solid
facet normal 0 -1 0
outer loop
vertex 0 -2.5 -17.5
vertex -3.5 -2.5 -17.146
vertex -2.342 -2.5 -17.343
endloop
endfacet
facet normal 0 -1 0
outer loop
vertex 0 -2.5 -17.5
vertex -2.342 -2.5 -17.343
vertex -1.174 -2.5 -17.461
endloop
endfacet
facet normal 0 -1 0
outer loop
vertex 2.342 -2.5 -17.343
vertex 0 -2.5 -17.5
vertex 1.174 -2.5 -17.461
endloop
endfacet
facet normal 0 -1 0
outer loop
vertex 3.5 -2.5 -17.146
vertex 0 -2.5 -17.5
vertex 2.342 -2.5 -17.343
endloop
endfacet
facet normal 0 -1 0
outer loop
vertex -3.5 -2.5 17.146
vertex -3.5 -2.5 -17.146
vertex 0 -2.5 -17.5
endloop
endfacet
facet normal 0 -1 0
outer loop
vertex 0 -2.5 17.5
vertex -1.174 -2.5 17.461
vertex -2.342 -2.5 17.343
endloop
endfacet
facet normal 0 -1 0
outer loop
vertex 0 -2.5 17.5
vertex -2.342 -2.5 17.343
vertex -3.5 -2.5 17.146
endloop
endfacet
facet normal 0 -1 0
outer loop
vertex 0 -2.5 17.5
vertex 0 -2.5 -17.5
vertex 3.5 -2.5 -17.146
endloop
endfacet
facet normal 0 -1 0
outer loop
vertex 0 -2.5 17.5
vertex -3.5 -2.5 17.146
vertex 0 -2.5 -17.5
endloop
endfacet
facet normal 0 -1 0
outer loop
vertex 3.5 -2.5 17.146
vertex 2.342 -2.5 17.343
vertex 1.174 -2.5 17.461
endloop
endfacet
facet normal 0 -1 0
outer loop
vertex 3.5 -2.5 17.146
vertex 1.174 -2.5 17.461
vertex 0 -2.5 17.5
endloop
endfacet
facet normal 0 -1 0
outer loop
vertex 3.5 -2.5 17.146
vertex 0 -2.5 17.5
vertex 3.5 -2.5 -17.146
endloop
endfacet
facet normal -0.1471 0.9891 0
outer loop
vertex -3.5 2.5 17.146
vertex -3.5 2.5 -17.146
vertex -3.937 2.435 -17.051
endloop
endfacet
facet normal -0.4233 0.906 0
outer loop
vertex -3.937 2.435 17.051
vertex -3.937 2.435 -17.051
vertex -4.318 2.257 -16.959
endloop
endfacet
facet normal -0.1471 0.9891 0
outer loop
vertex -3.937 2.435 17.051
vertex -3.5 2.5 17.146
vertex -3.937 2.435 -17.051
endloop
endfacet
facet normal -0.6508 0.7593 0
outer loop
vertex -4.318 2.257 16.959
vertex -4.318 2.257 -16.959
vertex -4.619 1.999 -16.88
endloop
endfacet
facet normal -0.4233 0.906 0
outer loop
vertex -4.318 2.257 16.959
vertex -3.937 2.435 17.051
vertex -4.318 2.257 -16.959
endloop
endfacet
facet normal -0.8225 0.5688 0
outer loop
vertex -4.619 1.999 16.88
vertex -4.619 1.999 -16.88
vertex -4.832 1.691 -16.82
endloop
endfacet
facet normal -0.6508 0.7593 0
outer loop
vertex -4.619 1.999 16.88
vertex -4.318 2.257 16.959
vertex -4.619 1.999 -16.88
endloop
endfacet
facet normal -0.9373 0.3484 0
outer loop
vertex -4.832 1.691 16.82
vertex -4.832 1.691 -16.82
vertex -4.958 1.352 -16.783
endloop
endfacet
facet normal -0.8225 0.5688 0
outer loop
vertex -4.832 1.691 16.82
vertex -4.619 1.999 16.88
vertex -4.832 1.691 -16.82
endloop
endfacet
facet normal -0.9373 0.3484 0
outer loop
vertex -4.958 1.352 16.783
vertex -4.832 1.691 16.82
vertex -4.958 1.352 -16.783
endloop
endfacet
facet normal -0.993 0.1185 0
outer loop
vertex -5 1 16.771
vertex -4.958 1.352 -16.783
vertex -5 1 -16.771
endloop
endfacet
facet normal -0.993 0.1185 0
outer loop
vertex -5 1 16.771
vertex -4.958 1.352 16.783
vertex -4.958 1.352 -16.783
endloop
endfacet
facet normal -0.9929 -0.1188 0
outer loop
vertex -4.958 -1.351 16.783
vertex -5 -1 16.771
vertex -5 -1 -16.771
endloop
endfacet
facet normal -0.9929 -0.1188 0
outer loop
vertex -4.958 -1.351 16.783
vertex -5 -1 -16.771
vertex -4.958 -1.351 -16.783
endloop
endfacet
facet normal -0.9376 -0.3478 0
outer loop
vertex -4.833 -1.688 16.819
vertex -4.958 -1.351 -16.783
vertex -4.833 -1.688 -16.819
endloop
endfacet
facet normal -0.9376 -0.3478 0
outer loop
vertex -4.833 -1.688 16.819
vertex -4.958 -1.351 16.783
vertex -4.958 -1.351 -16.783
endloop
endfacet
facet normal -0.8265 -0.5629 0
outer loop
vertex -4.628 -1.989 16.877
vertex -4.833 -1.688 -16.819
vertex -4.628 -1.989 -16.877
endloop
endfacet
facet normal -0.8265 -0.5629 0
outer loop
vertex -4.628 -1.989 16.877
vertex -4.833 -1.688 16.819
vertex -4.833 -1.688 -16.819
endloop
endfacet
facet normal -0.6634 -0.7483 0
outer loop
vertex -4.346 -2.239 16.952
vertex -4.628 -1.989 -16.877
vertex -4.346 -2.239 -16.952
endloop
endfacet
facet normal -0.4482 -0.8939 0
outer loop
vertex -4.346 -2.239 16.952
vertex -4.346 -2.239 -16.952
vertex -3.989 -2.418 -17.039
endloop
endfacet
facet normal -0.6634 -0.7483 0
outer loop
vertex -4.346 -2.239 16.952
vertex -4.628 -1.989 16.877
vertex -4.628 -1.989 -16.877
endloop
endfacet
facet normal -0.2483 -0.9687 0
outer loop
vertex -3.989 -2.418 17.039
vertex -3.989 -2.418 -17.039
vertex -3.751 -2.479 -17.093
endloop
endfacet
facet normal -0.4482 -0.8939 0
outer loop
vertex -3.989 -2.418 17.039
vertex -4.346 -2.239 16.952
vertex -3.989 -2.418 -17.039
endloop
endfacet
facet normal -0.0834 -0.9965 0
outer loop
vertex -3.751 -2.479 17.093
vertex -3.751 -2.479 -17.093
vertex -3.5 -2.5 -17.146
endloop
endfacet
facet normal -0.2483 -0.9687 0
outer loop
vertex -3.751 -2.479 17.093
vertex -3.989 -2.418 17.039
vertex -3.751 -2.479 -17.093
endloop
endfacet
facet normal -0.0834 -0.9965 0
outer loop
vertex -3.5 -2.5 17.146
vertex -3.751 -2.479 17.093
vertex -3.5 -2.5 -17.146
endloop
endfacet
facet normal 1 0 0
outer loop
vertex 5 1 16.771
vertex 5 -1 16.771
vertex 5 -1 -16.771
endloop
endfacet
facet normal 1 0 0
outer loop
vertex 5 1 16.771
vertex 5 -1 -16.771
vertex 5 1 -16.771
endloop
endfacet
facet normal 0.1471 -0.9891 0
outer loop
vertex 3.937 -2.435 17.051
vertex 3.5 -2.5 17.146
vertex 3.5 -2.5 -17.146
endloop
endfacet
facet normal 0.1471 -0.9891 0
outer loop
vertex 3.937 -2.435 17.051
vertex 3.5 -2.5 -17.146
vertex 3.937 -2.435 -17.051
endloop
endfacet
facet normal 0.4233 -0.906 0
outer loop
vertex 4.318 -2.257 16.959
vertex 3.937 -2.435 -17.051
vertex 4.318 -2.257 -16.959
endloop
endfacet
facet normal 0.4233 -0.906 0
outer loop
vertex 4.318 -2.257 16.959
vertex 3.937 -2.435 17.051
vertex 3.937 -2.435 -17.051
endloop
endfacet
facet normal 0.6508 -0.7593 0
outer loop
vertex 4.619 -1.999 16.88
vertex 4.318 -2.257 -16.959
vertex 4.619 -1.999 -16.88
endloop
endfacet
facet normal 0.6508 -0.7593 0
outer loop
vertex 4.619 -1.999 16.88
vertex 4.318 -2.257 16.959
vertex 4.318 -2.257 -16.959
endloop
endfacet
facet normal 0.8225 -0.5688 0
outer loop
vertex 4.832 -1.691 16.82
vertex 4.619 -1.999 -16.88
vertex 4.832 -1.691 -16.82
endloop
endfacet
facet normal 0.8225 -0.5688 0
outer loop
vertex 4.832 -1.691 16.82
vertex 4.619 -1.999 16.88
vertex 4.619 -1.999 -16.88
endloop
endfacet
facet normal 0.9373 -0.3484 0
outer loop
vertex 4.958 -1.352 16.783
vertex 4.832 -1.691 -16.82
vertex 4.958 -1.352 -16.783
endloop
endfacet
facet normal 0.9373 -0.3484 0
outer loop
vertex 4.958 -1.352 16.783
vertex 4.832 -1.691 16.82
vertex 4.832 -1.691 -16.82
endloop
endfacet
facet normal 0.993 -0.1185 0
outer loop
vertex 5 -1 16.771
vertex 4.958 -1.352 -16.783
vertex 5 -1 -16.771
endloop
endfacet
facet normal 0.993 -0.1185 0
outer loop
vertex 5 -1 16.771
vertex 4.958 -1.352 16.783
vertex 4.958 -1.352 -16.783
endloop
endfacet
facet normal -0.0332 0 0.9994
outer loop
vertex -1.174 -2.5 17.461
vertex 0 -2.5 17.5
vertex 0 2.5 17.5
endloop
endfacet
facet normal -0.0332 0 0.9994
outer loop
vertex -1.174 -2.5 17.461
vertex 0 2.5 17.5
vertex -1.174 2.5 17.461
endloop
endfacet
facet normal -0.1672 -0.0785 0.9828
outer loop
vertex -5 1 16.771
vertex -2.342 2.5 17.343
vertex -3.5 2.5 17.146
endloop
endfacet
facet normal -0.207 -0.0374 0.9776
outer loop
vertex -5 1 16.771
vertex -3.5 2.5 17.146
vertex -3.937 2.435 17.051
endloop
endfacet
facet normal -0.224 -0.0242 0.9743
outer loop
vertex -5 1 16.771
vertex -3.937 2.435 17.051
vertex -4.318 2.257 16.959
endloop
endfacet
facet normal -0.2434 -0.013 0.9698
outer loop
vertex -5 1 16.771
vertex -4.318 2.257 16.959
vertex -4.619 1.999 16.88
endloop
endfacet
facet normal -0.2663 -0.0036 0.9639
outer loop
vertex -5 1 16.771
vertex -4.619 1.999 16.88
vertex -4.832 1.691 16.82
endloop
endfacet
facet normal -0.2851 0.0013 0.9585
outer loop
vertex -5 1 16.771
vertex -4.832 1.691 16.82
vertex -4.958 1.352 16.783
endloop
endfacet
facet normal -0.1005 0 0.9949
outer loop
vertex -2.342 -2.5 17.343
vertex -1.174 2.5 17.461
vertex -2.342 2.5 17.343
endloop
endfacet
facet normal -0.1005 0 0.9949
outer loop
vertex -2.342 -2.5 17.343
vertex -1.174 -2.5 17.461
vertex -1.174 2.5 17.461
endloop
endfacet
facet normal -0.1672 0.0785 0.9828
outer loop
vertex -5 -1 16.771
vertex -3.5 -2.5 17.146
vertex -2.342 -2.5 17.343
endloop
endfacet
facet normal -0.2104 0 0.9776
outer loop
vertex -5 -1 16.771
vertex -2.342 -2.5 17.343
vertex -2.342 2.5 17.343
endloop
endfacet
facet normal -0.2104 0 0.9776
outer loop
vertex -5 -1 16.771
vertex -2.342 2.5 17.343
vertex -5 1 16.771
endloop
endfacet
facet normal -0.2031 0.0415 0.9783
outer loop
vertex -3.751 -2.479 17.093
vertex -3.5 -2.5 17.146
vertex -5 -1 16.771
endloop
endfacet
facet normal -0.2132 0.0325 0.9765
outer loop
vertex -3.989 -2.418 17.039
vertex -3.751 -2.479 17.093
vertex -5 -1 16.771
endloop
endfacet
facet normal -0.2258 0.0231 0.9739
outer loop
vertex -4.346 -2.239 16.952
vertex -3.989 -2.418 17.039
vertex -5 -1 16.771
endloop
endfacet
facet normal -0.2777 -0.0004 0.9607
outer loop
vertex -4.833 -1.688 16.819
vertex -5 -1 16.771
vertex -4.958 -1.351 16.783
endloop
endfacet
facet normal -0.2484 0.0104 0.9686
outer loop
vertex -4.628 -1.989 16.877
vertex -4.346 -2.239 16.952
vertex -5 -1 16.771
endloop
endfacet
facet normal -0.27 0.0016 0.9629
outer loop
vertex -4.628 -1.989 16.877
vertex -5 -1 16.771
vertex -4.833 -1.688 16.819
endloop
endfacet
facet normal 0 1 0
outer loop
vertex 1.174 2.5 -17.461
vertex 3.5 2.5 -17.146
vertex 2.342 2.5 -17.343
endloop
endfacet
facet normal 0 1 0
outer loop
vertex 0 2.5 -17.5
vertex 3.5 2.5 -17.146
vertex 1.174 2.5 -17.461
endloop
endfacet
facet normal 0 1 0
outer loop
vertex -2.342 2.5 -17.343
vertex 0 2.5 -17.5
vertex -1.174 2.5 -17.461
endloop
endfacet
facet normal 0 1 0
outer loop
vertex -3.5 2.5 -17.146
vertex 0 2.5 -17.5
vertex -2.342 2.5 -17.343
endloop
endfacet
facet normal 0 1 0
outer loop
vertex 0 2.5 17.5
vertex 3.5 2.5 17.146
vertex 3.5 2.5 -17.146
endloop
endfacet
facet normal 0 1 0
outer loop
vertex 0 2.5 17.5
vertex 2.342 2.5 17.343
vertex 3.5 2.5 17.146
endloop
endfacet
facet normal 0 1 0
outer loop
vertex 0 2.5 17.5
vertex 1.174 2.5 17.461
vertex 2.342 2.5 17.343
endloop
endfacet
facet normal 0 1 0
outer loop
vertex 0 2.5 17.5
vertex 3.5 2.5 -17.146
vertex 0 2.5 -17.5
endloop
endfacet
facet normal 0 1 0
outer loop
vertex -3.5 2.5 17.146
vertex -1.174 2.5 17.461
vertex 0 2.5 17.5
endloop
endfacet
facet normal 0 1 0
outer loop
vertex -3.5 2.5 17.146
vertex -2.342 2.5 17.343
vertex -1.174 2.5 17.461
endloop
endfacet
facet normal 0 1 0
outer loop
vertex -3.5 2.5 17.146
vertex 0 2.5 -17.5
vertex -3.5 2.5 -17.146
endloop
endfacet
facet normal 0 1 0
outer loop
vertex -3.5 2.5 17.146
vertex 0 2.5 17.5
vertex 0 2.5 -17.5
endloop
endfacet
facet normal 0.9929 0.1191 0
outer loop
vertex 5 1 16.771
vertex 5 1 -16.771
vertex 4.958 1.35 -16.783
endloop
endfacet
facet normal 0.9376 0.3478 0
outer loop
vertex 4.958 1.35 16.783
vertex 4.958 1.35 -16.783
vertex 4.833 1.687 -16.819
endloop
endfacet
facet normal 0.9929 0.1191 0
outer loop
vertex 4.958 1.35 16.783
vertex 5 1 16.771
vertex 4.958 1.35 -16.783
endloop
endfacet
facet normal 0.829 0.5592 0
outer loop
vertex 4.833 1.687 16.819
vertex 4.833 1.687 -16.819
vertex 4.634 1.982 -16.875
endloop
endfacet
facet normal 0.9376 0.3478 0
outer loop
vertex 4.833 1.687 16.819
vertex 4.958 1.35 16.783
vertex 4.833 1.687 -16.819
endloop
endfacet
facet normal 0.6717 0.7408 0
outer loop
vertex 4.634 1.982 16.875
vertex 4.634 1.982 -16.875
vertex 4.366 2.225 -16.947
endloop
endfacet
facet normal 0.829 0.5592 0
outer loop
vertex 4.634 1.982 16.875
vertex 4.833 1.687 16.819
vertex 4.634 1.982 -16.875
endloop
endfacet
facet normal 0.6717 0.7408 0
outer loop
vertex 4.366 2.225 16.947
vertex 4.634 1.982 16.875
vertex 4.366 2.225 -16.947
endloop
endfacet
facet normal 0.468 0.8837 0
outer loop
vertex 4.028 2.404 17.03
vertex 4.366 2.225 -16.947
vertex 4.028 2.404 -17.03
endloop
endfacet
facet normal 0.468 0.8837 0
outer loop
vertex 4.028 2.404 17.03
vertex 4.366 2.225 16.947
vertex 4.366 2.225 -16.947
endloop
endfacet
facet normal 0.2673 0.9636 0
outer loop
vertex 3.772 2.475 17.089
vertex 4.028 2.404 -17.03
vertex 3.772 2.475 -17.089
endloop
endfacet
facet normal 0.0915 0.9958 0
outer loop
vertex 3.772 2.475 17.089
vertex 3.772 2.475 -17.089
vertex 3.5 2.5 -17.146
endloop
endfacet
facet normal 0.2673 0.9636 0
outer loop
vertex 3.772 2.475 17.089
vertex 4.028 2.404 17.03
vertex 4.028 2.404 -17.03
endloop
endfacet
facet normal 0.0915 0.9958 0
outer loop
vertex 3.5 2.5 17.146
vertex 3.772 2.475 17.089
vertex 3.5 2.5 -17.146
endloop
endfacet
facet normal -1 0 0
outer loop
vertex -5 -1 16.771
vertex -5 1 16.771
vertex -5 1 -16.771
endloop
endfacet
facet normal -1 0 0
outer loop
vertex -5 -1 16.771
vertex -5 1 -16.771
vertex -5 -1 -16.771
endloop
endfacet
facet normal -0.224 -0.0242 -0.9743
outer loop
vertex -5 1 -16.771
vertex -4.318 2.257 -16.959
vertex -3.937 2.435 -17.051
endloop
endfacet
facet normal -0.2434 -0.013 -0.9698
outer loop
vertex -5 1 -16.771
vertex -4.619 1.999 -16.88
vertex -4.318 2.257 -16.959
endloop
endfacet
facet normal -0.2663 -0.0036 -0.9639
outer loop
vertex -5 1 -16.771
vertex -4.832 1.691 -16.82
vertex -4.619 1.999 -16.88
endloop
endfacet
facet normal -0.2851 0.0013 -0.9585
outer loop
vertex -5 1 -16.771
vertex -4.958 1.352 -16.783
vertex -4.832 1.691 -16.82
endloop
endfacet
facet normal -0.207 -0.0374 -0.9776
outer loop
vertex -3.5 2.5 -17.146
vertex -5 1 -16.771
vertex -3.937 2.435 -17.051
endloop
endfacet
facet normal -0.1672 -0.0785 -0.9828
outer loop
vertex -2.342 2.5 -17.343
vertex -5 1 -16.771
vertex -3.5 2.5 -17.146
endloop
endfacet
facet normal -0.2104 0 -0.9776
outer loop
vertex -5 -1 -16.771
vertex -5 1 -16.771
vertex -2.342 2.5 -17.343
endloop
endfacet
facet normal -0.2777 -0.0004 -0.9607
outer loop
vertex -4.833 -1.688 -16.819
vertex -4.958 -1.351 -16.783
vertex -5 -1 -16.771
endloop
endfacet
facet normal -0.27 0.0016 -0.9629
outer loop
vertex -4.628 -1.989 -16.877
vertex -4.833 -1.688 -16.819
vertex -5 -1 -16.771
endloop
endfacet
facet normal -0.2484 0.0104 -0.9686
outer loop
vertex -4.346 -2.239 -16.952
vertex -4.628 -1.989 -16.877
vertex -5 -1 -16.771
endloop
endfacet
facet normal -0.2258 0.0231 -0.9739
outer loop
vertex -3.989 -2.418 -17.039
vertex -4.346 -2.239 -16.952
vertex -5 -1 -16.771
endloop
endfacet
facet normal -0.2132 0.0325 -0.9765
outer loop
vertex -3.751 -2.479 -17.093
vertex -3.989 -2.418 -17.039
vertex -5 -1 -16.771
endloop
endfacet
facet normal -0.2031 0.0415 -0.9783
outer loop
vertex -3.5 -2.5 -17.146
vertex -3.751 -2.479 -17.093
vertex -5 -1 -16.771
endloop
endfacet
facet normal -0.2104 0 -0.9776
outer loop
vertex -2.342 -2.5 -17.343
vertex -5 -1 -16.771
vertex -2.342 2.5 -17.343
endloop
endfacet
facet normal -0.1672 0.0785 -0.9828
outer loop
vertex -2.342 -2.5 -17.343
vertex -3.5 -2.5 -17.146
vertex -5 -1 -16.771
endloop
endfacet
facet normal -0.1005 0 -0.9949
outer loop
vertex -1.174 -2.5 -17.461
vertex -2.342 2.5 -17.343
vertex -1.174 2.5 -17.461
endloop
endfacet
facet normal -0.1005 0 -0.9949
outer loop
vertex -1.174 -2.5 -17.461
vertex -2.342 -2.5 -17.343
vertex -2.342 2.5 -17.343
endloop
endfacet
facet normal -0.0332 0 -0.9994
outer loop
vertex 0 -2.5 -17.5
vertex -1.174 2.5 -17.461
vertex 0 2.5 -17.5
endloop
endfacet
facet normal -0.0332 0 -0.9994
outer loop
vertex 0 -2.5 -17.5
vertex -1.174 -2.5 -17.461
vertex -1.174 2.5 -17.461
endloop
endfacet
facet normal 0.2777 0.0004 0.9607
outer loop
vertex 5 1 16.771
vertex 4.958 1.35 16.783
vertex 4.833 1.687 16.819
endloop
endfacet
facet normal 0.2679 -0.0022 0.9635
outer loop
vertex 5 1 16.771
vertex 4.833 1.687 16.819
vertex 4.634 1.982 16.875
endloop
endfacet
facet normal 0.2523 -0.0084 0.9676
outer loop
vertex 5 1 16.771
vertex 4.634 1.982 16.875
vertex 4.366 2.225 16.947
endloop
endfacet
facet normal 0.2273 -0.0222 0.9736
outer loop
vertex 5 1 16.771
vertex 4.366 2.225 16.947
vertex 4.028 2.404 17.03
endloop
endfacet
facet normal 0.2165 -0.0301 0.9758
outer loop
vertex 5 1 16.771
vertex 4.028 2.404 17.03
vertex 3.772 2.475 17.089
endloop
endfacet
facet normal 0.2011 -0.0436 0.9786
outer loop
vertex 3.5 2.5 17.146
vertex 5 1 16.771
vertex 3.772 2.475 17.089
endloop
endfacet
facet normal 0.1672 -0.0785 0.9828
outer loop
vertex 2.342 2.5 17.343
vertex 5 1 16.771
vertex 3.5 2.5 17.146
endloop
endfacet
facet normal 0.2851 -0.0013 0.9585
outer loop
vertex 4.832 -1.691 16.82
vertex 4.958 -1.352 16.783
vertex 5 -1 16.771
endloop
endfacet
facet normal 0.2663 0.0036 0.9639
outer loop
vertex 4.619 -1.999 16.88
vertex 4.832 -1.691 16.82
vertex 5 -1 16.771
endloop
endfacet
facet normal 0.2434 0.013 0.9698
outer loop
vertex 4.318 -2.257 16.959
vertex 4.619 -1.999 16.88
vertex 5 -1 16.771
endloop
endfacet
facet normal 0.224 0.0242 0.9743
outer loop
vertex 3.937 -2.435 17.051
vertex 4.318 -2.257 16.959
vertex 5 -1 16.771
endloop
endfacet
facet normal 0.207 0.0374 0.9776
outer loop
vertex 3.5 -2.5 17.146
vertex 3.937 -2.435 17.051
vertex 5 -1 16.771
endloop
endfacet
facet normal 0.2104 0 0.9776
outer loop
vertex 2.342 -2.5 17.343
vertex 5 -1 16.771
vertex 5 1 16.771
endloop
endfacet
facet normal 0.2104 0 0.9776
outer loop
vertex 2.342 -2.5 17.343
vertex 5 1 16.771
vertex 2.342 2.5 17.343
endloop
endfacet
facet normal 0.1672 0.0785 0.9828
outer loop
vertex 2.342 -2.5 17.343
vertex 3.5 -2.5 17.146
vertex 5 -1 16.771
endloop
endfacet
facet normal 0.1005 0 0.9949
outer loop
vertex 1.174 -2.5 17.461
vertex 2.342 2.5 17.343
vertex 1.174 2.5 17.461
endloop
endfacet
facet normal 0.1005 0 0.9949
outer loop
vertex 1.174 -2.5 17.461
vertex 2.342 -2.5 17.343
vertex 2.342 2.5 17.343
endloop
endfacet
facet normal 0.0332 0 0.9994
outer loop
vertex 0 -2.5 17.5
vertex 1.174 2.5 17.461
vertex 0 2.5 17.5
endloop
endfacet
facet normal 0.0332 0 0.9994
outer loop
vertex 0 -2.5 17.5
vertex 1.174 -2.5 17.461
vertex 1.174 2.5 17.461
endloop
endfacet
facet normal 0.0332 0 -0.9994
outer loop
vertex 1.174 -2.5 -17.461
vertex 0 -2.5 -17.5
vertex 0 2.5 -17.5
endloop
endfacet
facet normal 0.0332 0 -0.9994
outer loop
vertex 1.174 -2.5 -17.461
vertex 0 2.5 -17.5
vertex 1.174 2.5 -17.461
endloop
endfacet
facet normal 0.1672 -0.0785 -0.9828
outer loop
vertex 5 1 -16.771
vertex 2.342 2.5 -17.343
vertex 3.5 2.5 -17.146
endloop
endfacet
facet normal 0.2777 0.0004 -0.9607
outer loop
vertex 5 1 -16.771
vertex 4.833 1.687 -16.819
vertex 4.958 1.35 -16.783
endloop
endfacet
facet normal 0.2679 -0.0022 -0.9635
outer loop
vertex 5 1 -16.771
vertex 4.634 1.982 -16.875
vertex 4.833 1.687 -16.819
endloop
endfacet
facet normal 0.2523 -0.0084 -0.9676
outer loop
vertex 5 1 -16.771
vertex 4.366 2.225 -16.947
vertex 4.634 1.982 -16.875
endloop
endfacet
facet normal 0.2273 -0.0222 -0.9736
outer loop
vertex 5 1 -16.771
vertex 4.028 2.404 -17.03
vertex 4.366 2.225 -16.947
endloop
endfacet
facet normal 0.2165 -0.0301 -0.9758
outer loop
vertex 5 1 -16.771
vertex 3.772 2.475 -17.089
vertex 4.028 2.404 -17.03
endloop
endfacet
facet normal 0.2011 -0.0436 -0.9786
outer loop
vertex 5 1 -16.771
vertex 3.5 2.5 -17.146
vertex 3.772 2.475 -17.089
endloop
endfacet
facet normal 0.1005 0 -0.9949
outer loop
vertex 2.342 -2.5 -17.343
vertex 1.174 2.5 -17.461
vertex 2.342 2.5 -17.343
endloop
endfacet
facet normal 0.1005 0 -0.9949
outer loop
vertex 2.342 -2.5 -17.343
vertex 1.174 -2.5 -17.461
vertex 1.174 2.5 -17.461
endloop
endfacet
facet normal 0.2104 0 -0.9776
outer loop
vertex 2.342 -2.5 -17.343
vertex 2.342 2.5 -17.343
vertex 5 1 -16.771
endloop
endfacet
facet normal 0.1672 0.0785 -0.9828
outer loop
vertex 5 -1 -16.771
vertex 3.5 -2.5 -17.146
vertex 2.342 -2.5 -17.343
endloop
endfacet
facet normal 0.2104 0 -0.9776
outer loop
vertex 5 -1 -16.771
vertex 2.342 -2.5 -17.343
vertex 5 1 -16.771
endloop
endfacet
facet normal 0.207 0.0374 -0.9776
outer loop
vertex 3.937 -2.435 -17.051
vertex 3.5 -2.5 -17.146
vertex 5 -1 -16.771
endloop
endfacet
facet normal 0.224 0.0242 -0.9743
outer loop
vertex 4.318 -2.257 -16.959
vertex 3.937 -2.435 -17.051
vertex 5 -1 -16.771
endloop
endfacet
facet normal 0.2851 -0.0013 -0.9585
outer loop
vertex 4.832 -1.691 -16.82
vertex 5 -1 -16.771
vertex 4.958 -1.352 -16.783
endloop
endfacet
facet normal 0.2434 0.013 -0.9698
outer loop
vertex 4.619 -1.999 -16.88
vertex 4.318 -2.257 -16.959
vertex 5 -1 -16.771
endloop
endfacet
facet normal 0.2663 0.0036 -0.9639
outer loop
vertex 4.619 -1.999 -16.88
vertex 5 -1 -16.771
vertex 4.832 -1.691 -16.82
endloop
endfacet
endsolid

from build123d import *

# Parameters (mm, degrees)
BOSS_EXTRUDE1_DEPTH = 17.5
CUT_EXTRUDE1_START  = -2.5
CUT_EXTRUDE1_DEPTH  = 5


# Read off the part's stored shape, not the designer's step: Cut-Extrude1
with BuildPart() as part:
    # Sketch1 → Boss-Extrude1 (new, symmetric)
    with BuildSketch(Plane.XY):
        with BuildLine():
            Line((-3.5, -2.5), (3.5, -2.5))
            ThreePointArc((3.5, -2.5), (4.560660172, -2.060660172), (5, -1))
            Line((5, -1), (5, 1))
            ThreePointArc((5, 1), (4.560660172, 2.060660172), (3.5, 2.5))
            Line((3.5, 2.5), (-3.5, 2.5))
            ThreePointArc((-3.5, 2.5), (-4.560660172, 2.060660172), (-5, 1))
            Line((-5, 1), (-5, -1))
            ThreePointArc((-5, -1), (-4.560660172, -2.060660172), (-3.5, -2.5))
        make_face()
    extrude(amount=BOSS_EXTRUDE1_DEPTH, both=True)

    # Cut-Extrude1 outline → Cut-Extrude1 (cut)
    with BuildSketch(Plane(origin=(0, 0, 0), x_dir=(1, 0, 0), z_dir=(0, 1, 0)).offset(CUT_EXTRUDE1_START)):
        with BuildLine():
            ThreePointArc((-1.03e-07, -17.5), (-2.52646852, -17.316667024), (-5.000001513, -16.77050938))
            Line((-5.000001513, -16.77050938), (-5, -17.5))
            Line((-5, -17.5), (-1.03e-07, -17.5))
        make_face()
        with BuildLine():
            ThreePointArc((5.000001513, -16.77050938), (2.526468418, -17.316667039), (-1.03e-07, -17.5))
            Line((-1.03e-07, -17.5), (5, -17.5))
            Line((5, -17.5), (5.000001513, -16.77050938))
        make_face()
        with BuildLine():
            Line((-5, 17.5), (-5.000001513, 16.77050938))
            ThreePointArc((-5.000001513, 16.77050938), (-2.526468418, 17.316667039), (1.03e-07, 17.5))
            Line((1.03e-07, 17.5), (-5, 17.5))
        make_face()
        with BuildLine():
            Line((5, 17.5), (1.03e-07, 17.5))
            ThreePointArc((1.03e-07, 17.5), (2.52646852, 17.316667024), (5.000001513, 16.77050938))
            Line((5.000001513, 16.77050938), (5, 17.5))
        make_face()
    extrude(amount=CUT_EXTRUDE1_DEPTH, mode=Mode.SUBTRACT)


solid = part.part
